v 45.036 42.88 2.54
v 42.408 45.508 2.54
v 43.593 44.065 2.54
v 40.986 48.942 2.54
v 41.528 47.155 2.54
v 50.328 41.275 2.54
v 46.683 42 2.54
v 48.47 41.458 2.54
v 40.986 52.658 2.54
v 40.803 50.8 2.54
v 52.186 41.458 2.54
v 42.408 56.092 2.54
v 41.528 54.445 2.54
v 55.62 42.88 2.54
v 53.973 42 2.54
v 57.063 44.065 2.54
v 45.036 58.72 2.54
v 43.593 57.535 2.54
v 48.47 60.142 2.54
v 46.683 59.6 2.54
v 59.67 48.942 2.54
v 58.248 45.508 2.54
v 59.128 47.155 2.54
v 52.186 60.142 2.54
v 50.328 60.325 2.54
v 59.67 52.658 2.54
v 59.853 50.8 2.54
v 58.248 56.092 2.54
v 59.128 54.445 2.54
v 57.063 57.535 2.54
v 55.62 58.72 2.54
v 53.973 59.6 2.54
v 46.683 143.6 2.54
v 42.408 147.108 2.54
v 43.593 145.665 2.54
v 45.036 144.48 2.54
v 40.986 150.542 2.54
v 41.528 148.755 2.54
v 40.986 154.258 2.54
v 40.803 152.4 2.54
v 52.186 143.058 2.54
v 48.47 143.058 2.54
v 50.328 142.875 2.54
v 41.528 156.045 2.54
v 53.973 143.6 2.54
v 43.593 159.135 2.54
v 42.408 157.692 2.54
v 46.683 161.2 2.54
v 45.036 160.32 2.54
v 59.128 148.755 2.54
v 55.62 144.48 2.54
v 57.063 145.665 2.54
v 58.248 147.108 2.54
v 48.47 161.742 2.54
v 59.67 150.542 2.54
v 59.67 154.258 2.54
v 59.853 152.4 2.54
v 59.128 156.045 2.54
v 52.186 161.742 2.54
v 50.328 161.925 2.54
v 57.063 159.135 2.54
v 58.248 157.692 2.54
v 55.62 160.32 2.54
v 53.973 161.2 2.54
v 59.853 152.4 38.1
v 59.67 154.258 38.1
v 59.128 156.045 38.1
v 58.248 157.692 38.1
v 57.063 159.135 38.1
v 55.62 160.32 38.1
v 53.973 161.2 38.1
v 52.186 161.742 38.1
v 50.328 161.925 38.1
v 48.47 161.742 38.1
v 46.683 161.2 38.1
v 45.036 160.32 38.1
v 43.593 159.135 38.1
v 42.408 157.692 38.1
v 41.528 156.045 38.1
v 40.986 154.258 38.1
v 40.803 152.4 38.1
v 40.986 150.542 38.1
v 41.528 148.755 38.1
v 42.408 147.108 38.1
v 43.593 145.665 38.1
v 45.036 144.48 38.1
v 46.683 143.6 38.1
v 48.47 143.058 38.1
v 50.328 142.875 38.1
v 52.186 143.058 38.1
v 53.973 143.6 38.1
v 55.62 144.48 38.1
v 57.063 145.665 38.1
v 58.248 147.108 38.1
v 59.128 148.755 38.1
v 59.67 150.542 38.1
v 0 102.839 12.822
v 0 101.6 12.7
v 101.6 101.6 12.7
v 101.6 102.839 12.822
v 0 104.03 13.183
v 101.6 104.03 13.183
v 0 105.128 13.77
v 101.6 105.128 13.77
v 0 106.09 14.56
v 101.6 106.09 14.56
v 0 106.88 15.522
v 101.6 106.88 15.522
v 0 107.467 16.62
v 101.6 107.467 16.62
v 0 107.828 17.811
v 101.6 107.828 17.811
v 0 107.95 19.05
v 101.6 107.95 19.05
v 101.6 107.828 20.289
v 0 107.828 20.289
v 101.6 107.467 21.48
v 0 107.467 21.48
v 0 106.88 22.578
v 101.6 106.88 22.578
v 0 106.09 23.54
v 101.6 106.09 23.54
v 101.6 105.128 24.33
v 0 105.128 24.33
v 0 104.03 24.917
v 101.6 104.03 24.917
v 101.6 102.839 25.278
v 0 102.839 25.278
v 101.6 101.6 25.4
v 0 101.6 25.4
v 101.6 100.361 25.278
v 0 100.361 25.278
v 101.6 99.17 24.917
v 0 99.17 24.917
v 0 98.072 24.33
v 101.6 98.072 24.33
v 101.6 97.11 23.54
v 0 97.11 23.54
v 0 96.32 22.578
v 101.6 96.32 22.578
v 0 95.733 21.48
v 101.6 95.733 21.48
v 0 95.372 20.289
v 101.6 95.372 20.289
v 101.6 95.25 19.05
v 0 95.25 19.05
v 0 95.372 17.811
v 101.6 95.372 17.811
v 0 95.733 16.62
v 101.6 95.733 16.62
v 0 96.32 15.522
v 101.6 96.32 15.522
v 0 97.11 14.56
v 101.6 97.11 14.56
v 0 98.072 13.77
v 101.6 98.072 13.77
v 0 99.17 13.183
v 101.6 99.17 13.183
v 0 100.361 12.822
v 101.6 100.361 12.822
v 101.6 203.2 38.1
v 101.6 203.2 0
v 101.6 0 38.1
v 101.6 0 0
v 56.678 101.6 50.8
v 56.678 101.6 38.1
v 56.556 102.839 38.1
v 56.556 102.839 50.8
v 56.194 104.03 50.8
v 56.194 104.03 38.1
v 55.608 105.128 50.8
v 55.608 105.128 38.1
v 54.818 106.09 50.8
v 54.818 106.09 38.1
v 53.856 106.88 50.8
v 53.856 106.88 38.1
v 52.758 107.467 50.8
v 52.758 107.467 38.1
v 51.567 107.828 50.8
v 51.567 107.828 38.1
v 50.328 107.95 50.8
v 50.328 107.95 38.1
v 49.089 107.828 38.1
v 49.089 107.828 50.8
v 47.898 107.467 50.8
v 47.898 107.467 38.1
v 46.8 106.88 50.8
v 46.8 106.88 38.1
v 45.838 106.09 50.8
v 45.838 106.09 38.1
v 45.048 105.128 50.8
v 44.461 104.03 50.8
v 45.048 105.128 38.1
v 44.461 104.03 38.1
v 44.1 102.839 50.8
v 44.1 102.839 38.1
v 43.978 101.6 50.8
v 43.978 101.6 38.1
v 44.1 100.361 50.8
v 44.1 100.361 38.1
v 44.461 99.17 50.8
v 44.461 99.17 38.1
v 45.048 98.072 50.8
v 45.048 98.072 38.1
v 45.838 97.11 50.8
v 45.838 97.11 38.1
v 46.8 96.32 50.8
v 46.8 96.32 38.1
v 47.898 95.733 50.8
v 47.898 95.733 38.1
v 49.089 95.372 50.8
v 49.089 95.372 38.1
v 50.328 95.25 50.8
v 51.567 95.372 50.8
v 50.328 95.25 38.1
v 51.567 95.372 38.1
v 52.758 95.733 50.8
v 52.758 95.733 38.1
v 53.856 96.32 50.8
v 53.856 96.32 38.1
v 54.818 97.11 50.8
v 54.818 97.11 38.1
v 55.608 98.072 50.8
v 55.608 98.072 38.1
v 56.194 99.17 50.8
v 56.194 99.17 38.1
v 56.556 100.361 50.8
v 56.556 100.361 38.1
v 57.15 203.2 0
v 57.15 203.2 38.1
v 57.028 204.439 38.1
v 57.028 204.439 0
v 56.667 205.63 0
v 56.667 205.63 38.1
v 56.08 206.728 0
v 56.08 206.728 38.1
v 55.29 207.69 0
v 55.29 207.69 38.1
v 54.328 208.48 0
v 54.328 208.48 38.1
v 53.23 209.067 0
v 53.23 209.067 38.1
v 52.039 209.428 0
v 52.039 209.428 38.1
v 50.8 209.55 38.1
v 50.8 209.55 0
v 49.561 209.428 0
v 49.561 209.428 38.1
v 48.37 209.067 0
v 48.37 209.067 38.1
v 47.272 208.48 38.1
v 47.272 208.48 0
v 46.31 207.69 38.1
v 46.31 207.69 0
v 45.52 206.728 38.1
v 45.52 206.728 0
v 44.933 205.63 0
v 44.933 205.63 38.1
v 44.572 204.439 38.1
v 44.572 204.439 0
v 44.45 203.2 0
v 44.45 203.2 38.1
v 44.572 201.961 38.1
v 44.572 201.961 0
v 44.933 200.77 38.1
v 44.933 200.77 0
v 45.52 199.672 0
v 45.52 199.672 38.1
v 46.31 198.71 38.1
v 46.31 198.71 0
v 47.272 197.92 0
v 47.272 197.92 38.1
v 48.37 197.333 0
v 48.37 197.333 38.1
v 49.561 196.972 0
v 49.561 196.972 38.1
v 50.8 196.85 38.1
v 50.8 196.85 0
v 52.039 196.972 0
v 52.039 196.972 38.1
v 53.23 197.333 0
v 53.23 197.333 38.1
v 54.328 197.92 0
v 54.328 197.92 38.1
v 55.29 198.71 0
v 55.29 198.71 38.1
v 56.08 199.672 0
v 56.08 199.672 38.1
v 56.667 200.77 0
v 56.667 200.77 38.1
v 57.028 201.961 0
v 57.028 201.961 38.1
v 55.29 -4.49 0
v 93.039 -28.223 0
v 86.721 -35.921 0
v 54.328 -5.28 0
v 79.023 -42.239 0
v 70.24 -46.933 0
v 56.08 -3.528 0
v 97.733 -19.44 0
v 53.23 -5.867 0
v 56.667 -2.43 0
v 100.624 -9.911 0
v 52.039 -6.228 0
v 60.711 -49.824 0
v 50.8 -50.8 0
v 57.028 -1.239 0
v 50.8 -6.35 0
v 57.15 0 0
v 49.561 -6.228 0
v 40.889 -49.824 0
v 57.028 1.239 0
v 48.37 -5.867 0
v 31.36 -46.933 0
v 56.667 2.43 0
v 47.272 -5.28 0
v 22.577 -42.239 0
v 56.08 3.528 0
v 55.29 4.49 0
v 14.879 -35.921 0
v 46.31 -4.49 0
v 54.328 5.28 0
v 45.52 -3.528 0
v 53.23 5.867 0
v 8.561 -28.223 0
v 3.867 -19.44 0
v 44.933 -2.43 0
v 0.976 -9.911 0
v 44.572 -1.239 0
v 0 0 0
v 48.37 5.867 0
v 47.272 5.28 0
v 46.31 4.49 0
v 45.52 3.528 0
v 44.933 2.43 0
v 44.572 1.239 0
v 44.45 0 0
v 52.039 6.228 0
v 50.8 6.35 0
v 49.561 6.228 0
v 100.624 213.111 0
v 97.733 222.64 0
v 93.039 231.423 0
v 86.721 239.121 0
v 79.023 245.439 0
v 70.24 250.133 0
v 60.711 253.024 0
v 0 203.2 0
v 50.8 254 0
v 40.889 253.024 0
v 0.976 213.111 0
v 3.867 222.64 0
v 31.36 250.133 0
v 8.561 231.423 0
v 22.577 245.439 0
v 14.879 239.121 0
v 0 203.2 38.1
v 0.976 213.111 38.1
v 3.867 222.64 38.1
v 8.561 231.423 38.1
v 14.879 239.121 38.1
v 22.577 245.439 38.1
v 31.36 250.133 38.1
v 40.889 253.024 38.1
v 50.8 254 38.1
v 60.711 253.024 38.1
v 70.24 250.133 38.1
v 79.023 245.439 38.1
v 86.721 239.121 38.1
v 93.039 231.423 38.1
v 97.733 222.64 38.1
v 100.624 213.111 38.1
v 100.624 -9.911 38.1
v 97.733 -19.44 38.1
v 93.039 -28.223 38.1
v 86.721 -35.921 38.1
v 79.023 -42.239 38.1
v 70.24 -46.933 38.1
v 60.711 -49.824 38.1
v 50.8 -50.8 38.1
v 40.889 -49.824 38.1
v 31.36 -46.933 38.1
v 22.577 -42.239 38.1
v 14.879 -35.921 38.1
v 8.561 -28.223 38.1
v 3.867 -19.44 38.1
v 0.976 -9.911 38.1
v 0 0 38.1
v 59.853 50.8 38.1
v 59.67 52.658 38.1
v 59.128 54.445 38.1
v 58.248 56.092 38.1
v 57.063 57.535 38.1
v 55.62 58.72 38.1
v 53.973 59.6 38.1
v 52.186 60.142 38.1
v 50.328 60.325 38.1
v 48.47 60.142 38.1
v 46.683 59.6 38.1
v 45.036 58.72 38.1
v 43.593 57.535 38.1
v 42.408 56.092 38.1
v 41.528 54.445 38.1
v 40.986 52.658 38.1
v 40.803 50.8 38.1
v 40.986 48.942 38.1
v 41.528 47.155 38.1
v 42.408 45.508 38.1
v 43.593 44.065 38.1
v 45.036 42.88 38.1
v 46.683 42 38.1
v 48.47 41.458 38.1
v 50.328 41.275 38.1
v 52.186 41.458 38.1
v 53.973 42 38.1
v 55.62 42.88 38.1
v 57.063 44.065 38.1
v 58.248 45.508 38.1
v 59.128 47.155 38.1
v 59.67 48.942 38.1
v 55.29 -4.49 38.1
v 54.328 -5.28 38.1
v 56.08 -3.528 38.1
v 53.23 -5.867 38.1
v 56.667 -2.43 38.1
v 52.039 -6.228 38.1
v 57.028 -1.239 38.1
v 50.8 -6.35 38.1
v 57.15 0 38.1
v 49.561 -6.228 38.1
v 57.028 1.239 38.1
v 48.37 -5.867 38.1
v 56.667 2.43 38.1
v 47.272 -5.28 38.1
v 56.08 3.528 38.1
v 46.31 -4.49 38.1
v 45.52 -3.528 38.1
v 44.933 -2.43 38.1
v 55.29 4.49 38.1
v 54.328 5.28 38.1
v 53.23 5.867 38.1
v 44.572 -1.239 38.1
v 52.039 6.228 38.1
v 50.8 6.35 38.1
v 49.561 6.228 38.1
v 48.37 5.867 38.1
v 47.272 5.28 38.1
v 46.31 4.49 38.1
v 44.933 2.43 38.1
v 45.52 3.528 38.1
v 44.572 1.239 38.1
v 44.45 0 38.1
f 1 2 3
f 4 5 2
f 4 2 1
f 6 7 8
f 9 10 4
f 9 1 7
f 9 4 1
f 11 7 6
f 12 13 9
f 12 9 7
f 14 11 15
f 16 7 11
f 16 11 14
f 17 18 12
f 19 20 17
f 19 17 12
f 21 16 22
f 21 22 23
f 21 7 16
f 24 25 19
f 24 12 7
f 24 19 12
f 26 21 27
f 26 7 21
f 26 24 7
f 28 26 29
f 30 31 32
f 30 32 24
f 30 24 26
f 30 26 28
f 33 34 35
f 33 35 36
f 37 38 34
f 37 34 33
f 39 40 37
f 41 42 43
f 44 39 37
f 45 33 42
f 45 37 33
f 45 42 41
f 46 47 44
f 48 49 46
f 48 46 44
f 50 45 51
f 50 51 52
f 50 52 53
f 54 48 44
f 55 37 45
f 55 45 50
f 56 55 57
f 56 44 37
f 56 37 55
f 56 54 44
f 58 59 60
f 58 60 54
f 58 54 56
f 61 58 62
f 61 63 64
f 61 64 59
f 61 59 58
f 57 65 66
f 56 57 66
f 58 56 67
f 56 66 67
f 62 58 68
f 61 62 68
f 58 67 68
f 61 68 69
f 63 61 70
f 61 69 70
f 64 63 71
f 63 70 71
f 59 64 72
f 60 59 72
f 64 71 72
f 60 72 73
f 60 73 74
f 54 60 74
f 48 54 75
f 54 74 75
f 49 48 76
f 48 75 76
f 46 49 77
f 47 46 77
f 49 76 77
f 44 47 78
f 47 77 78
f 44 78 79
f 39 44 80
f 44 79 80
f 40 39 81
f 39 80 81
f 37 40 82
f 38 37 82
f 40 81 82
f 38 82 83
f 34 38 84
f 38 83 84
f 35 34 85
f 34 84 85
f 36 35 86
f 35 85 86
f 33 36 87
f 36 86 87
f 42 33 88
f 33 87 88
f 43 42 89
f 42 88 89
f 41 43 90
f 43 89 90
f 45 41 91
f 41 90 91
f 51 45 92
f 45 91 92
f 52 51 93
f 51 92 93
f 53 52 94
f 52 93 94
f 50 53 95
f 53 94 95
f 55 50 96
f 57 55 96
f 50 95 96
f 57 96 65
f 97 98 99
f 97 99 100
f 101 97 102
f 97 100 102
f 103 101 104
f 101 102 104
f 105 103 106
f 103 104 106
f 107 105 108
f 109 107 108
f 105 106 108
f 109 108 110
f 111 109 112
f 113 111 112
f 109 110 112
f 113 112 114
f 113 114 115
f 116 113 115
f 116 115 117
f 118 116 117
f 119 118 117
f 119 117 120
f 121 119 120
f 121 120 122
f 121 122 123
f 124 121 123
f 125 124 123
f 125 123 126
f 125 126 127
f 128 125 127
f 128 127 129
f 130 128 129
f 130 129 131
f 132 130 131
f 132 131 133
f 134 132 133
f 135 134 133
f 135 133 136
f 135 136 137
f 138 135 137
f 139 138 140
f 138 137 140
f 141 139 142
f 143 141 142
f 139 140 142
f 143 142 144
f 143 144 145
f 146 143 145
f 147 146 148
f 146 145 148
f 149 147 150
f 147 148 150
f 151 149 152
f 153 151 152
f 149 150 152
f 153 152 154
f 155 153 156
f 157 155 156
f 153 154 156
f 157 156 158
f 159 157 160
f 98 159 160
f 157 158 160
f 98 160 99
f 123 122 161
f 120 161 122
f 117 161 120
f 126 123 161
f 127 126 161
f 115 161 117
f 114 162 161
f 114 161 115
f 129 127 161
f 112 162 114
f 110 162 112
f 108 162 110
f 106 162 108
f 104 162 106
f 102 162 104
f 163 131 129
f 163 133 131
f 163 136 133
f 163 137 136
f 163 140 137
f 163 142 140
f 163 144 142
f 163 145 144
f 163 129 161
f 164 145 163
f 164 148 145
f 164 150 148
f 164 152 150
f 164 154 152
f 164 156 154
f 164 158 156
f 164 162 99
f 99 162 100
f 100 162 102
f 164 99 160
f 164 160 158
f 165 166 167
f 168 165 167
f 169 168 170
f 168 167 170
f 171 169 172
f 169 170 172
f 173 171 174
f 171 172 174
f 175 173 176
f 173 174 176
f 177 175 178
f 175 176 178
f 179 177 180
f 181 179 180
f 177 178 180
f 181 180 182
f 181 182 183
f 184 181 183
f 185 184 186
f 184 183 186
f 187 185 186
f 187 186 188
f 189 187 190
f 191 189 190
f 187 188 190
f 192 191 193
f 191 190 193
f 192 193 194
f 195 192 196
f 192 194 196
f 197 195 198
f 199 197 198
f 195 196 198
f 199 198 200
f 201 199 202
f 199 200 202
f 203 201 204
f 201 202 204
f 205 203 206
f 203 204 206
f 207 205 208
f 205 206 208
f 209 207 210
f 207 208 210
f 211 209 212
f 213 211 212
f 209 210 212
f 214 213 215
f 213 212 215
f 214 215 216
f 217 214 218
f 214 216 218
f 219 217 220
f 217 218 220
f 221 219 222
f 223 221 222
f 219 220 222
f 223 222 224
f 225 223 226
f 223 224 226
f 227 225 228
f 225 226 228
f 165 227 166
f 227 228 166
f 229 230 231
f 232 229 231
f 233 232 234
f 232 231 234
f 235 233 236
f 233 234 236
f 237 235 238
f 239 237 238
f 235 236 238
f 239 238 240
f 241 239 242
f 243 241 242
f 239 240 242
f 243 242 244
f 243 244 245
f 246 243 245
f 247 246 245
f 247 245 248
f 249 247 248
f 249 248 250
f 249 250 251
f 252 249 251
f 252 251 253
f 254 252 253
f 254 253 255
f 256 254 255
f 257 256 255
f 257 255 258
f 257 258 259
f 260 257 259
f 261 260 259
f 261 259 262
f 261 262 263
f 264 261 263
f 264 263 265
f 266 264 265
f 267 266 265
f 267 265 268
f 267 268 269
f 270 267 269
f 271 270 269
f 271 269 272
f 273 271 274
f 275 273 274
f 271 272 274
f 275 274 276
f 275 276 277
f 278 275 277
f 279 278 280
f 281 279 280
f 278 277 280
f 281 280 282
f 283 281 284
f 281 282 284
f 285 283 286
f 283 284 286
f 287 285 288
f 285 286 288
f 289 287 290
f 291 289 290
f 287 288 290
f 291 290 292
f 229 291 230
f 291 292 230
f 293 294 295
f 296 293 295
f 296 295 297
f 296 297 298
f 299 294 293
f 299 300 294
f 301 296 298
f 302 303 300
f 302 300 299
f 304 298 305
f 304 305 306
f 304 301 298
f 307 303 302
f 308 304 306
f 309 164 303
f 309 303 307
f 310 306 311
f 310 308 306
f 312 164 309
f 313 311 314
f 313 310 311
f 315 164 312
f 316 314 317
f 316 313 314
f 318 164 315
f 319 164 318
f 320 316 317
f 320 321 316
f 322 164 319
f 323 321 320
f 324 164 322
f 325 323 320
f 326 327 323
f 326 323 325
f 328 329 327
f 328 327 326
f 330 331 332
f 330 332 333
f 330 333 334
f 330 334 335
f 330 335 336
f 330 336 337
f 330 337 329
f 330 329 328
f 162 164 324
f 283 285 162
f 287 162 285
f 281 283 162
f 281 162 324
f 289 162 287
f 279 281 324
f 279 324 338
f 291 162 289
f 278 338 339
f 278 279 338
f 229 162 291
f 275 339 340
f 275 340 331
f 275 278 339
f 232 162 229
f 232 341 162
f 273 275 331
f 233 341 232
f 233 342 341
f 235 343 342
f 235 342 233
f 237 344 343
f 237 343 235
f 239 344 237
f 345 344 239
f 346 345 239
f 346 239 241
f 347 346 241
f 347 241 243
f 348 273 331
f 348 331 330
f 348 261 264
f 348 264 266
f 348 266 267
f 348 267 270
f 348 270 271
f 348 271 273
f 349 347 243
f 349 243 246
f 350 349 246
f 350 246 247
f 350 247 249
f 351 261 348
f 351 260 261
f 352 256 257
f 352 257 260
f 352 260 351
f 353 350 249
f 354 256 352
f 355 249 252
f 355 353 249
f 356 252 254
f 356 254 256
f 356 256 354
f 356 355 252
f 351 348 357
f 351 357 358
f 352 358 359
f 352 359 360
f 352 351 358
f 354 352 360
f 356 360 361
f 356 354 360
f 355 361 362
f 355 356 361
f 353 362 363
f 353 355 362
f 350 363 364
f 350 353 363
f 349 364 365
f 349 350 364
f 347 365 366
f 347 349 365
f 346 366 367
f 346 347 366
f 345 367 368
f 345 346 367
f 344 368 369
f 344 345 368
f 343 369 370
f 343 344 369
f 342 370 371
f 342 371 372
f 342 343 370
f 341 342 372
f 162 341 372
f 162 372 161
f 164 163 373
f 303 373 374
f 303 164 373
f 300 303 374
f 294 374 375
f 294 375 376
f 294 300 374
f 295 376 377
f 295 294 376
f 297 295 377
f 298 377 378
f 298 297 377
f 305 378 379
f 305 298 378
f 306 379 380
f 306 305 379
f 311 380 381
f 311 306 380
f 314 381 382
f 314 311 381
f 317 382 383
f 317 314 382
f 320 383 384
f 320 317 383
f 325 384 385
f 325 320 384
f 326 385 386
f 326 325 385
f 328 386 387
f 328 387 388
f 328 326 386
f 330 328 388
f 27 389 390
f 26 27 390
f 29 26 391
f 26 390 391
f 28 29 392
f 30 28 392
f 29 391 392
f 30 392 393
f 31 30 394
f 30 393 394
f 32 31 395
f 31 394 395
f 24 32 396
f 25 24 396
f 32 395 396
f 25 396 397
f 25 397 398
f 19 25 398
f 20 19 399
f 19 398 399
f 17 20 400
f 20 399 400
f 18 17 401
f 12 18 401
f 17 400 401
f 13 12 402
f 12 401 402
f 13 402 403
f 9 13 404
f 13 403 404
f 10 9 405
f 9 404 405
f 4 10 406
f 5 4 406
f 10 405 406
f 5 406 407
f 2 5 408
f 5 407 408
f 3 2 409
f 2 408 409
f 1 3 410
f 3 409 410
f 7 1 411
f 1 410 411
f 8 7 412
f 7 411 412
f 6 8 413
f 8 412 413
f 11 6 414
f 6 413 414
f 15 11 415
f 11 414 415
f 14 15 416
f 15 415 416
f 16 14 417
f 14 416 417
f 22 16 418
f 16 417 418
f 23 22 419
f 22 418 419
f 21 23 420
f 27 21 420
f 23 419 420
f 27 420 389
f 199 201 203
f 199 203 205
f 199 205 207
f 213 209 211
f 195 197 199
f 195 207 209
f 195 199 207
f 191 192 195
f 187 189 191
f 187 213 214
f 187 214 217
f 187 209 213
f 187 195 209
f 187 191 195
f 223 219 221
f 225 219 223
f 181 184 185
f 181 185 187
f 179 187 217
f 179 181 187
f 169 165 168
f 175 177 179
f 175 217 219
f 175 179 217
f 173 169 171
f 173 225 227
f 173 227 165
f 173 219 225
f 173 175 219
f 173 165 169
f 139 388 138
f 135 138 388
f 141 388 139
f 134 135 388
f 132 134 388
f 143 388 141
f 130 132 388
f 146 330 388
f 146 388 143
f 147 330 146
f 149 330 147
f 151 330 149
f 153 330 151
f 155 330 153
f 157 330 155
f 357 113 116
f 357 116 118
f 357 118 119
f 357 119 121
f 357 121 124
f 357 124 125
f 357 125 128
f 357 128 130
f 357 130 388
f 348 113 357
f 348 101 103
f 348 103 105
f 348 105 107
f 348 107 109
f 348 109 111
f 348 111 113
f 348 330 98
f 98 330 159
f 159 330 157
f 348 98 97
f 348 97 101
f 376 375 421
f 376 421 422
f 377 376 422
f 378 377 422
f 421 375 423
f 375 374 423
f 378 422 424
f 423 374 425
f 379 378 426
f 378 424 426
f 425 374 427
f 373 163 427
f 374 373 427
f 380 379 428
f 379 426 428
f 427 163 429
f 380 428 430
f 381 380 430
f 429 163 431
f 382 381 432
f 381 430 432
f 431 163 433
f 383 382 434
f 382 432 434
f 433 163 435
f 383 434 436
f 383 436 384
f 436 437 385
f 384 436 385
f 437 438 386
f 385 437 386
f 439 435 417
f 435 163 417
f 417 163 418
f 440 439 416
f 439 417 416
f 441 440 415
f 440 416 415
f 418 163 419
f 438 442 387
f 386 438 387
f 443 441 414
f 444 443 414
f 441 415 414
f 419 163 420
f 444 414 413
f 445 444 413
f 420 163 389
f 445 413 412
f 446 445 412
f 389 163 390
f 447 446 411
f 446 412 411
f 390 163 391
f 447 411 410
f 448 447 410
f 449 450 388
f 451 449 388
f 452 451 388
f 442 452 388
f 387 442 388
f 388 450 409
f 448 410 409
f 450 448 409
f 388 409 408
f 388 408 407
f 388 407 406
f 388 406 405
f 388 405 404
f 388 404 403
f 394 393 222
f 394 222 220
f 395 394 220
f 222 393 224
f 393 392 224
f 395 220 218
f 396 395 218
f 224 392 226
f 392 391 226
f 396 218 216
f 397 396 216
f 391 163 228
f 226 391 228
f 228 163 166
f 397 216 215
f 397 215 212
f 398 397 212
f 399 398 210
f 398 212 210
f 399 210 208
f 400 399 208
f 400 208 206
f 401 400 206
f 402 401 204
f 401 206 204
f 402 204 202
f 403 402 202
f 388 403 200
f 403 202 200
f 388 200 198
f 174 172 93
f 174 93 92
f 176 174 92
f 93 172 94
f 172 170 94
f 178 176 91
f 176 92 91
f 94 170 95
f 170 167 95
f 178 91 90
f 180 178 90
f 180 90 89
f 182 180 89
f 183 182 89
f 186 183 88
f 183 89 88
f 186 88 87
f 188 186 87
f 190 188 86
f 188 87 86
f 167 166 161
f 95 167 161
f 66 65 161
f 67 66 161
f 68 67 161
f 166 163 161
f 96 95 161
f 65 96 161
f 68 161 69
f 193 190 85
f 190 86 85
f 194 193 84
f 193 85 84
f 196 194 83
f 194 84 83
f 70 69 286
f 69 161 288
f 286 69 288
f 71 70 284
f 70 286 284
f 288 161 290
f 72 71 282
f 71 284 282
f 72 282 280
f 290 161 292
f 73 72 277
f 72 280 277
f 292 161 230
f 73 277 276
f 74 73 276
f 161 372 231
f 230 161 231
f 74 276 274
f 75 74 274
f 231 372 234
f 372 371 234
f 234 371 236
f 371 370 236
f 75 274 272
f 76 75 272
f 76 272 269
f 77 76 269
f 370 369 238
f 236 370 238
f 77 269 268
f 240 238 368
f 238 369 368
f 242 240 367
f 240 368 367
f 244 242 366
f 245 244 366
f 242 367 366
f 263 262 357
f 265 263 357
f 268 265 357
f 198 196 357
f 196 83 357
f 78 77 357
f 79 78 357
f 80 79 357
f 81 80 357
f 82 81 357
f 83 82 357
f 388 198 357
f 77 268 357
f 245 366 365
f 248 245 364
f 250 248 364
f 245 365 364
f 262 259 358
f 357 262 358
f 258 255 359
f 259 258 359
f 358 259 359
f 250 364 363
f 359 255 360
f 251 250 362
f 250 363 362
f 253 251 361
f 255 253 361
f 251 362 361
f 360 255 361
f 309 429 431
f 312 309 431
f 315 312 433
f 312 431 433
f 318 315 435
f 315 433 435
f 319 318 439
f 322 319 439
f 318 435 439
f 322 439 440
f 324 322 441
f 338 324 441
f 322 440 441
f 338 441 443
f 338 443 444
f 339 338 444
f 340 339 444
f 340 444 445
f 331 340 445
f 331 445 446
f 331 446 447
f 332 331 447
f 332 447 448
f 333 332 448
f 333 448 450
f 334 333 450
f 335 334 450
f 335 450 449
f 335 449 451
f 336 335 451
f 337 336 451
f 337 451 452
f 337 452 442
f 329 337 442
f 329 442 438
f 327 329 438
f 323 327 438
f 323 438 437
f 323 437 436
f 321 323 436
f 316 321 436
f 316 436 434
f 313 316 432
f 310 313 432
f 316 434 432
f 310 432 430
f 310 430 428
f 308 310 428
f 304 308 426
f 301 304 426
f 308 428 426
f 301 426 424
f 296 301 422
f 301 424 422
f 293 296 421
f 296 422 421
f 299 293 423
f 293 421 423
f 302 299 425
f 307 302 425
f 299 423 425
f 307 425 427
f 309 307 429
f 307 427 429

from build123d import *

# Parameters (mm, degrees)
BOSS_EXTRUDE1_DEPTH = 38.1
SKETCH2_R           = 6.35
CUT_EXTRUDE1_DEPTH  = 277.206752271
SKETCH3_R           = 9.525
CUT_EXTRUDE3_DEPTH  = 35.56
SKETCH5_R           = 6.35
BOSS_EXTRUDE2_DEPTH = 12.7
SKETCH6_R           = 6.35
CUT_EXTRUDE4_DEPTH  = 279.243059213


with BuildPart() as part:
    # Sketch1 → Boss-Extrude1 (new body)
    with BuildSketch(Plane.XY):
        with BuildLine():
            Line((0, 0), (0, 203.2))
            ThreePointArc((0, 203.2), (50.8, 254), (101.6, 203.2))
            Line((101.6, 203.2), (101.6, 0))
            ThreePointArc((101.6, 0), (50.8, -50.8), (0, 0))
        make_face()
    extrude(amount=BOSS_EXTRUDE1_DEPTH)

    # Sketch2 → Cut-Extrude1 (cut, through all)
    with BuildSketch(Plane.XY.offset(38.1)):
        with Locations((50.8, 203.2)):
            Circle(SKETCH2_R)
        with Locations((50.8, 0)):
            Circle(SKETCH2_R)
    extrude(amount=-CUT_EXTRUDE1_DEPTH, mode=Mode.SUBTRACT)

    # Sketch3 → Cut-Extrude3 (cut)
    with BuildSketch(Plane.XY.offset(38.1)):
        with Locations((50.327847378, 152.4)):
            Circle(SKETCH3_R)
        with Locations((50.327847378, 50.8)):
            Circle(SKETCH3_R)
    extrude(amount=-CUT_EXTRUDE3_DEPTH, mode=Mode.SUBTRACT)

    # Sketch5 → Boss-Extrude2 (add)
    with BuildSketch(Plane.XY.offset(38.1)):
        with Locations((50.327847378, 101.6)):
            Circle(SKETCH5_R)
    extrude(amount=BOSS_EXTRUDE2_DEPTH)

    # Sketch6 → Cut-Extrude4 (cut, through all)
    with BuildSketch(Plane(origin=(101.6, 0, 0), x_dir=(0, 0, -1), z_dir=(1, 0, 0))):
        with Locations((-19.05, 101.6)):
            Circle(SKETCH6_R)
    extrude(amount=-CUT_EXTRUDE4_DEPTH, mode=Mode.SUBTRACT)


solid = part.part
